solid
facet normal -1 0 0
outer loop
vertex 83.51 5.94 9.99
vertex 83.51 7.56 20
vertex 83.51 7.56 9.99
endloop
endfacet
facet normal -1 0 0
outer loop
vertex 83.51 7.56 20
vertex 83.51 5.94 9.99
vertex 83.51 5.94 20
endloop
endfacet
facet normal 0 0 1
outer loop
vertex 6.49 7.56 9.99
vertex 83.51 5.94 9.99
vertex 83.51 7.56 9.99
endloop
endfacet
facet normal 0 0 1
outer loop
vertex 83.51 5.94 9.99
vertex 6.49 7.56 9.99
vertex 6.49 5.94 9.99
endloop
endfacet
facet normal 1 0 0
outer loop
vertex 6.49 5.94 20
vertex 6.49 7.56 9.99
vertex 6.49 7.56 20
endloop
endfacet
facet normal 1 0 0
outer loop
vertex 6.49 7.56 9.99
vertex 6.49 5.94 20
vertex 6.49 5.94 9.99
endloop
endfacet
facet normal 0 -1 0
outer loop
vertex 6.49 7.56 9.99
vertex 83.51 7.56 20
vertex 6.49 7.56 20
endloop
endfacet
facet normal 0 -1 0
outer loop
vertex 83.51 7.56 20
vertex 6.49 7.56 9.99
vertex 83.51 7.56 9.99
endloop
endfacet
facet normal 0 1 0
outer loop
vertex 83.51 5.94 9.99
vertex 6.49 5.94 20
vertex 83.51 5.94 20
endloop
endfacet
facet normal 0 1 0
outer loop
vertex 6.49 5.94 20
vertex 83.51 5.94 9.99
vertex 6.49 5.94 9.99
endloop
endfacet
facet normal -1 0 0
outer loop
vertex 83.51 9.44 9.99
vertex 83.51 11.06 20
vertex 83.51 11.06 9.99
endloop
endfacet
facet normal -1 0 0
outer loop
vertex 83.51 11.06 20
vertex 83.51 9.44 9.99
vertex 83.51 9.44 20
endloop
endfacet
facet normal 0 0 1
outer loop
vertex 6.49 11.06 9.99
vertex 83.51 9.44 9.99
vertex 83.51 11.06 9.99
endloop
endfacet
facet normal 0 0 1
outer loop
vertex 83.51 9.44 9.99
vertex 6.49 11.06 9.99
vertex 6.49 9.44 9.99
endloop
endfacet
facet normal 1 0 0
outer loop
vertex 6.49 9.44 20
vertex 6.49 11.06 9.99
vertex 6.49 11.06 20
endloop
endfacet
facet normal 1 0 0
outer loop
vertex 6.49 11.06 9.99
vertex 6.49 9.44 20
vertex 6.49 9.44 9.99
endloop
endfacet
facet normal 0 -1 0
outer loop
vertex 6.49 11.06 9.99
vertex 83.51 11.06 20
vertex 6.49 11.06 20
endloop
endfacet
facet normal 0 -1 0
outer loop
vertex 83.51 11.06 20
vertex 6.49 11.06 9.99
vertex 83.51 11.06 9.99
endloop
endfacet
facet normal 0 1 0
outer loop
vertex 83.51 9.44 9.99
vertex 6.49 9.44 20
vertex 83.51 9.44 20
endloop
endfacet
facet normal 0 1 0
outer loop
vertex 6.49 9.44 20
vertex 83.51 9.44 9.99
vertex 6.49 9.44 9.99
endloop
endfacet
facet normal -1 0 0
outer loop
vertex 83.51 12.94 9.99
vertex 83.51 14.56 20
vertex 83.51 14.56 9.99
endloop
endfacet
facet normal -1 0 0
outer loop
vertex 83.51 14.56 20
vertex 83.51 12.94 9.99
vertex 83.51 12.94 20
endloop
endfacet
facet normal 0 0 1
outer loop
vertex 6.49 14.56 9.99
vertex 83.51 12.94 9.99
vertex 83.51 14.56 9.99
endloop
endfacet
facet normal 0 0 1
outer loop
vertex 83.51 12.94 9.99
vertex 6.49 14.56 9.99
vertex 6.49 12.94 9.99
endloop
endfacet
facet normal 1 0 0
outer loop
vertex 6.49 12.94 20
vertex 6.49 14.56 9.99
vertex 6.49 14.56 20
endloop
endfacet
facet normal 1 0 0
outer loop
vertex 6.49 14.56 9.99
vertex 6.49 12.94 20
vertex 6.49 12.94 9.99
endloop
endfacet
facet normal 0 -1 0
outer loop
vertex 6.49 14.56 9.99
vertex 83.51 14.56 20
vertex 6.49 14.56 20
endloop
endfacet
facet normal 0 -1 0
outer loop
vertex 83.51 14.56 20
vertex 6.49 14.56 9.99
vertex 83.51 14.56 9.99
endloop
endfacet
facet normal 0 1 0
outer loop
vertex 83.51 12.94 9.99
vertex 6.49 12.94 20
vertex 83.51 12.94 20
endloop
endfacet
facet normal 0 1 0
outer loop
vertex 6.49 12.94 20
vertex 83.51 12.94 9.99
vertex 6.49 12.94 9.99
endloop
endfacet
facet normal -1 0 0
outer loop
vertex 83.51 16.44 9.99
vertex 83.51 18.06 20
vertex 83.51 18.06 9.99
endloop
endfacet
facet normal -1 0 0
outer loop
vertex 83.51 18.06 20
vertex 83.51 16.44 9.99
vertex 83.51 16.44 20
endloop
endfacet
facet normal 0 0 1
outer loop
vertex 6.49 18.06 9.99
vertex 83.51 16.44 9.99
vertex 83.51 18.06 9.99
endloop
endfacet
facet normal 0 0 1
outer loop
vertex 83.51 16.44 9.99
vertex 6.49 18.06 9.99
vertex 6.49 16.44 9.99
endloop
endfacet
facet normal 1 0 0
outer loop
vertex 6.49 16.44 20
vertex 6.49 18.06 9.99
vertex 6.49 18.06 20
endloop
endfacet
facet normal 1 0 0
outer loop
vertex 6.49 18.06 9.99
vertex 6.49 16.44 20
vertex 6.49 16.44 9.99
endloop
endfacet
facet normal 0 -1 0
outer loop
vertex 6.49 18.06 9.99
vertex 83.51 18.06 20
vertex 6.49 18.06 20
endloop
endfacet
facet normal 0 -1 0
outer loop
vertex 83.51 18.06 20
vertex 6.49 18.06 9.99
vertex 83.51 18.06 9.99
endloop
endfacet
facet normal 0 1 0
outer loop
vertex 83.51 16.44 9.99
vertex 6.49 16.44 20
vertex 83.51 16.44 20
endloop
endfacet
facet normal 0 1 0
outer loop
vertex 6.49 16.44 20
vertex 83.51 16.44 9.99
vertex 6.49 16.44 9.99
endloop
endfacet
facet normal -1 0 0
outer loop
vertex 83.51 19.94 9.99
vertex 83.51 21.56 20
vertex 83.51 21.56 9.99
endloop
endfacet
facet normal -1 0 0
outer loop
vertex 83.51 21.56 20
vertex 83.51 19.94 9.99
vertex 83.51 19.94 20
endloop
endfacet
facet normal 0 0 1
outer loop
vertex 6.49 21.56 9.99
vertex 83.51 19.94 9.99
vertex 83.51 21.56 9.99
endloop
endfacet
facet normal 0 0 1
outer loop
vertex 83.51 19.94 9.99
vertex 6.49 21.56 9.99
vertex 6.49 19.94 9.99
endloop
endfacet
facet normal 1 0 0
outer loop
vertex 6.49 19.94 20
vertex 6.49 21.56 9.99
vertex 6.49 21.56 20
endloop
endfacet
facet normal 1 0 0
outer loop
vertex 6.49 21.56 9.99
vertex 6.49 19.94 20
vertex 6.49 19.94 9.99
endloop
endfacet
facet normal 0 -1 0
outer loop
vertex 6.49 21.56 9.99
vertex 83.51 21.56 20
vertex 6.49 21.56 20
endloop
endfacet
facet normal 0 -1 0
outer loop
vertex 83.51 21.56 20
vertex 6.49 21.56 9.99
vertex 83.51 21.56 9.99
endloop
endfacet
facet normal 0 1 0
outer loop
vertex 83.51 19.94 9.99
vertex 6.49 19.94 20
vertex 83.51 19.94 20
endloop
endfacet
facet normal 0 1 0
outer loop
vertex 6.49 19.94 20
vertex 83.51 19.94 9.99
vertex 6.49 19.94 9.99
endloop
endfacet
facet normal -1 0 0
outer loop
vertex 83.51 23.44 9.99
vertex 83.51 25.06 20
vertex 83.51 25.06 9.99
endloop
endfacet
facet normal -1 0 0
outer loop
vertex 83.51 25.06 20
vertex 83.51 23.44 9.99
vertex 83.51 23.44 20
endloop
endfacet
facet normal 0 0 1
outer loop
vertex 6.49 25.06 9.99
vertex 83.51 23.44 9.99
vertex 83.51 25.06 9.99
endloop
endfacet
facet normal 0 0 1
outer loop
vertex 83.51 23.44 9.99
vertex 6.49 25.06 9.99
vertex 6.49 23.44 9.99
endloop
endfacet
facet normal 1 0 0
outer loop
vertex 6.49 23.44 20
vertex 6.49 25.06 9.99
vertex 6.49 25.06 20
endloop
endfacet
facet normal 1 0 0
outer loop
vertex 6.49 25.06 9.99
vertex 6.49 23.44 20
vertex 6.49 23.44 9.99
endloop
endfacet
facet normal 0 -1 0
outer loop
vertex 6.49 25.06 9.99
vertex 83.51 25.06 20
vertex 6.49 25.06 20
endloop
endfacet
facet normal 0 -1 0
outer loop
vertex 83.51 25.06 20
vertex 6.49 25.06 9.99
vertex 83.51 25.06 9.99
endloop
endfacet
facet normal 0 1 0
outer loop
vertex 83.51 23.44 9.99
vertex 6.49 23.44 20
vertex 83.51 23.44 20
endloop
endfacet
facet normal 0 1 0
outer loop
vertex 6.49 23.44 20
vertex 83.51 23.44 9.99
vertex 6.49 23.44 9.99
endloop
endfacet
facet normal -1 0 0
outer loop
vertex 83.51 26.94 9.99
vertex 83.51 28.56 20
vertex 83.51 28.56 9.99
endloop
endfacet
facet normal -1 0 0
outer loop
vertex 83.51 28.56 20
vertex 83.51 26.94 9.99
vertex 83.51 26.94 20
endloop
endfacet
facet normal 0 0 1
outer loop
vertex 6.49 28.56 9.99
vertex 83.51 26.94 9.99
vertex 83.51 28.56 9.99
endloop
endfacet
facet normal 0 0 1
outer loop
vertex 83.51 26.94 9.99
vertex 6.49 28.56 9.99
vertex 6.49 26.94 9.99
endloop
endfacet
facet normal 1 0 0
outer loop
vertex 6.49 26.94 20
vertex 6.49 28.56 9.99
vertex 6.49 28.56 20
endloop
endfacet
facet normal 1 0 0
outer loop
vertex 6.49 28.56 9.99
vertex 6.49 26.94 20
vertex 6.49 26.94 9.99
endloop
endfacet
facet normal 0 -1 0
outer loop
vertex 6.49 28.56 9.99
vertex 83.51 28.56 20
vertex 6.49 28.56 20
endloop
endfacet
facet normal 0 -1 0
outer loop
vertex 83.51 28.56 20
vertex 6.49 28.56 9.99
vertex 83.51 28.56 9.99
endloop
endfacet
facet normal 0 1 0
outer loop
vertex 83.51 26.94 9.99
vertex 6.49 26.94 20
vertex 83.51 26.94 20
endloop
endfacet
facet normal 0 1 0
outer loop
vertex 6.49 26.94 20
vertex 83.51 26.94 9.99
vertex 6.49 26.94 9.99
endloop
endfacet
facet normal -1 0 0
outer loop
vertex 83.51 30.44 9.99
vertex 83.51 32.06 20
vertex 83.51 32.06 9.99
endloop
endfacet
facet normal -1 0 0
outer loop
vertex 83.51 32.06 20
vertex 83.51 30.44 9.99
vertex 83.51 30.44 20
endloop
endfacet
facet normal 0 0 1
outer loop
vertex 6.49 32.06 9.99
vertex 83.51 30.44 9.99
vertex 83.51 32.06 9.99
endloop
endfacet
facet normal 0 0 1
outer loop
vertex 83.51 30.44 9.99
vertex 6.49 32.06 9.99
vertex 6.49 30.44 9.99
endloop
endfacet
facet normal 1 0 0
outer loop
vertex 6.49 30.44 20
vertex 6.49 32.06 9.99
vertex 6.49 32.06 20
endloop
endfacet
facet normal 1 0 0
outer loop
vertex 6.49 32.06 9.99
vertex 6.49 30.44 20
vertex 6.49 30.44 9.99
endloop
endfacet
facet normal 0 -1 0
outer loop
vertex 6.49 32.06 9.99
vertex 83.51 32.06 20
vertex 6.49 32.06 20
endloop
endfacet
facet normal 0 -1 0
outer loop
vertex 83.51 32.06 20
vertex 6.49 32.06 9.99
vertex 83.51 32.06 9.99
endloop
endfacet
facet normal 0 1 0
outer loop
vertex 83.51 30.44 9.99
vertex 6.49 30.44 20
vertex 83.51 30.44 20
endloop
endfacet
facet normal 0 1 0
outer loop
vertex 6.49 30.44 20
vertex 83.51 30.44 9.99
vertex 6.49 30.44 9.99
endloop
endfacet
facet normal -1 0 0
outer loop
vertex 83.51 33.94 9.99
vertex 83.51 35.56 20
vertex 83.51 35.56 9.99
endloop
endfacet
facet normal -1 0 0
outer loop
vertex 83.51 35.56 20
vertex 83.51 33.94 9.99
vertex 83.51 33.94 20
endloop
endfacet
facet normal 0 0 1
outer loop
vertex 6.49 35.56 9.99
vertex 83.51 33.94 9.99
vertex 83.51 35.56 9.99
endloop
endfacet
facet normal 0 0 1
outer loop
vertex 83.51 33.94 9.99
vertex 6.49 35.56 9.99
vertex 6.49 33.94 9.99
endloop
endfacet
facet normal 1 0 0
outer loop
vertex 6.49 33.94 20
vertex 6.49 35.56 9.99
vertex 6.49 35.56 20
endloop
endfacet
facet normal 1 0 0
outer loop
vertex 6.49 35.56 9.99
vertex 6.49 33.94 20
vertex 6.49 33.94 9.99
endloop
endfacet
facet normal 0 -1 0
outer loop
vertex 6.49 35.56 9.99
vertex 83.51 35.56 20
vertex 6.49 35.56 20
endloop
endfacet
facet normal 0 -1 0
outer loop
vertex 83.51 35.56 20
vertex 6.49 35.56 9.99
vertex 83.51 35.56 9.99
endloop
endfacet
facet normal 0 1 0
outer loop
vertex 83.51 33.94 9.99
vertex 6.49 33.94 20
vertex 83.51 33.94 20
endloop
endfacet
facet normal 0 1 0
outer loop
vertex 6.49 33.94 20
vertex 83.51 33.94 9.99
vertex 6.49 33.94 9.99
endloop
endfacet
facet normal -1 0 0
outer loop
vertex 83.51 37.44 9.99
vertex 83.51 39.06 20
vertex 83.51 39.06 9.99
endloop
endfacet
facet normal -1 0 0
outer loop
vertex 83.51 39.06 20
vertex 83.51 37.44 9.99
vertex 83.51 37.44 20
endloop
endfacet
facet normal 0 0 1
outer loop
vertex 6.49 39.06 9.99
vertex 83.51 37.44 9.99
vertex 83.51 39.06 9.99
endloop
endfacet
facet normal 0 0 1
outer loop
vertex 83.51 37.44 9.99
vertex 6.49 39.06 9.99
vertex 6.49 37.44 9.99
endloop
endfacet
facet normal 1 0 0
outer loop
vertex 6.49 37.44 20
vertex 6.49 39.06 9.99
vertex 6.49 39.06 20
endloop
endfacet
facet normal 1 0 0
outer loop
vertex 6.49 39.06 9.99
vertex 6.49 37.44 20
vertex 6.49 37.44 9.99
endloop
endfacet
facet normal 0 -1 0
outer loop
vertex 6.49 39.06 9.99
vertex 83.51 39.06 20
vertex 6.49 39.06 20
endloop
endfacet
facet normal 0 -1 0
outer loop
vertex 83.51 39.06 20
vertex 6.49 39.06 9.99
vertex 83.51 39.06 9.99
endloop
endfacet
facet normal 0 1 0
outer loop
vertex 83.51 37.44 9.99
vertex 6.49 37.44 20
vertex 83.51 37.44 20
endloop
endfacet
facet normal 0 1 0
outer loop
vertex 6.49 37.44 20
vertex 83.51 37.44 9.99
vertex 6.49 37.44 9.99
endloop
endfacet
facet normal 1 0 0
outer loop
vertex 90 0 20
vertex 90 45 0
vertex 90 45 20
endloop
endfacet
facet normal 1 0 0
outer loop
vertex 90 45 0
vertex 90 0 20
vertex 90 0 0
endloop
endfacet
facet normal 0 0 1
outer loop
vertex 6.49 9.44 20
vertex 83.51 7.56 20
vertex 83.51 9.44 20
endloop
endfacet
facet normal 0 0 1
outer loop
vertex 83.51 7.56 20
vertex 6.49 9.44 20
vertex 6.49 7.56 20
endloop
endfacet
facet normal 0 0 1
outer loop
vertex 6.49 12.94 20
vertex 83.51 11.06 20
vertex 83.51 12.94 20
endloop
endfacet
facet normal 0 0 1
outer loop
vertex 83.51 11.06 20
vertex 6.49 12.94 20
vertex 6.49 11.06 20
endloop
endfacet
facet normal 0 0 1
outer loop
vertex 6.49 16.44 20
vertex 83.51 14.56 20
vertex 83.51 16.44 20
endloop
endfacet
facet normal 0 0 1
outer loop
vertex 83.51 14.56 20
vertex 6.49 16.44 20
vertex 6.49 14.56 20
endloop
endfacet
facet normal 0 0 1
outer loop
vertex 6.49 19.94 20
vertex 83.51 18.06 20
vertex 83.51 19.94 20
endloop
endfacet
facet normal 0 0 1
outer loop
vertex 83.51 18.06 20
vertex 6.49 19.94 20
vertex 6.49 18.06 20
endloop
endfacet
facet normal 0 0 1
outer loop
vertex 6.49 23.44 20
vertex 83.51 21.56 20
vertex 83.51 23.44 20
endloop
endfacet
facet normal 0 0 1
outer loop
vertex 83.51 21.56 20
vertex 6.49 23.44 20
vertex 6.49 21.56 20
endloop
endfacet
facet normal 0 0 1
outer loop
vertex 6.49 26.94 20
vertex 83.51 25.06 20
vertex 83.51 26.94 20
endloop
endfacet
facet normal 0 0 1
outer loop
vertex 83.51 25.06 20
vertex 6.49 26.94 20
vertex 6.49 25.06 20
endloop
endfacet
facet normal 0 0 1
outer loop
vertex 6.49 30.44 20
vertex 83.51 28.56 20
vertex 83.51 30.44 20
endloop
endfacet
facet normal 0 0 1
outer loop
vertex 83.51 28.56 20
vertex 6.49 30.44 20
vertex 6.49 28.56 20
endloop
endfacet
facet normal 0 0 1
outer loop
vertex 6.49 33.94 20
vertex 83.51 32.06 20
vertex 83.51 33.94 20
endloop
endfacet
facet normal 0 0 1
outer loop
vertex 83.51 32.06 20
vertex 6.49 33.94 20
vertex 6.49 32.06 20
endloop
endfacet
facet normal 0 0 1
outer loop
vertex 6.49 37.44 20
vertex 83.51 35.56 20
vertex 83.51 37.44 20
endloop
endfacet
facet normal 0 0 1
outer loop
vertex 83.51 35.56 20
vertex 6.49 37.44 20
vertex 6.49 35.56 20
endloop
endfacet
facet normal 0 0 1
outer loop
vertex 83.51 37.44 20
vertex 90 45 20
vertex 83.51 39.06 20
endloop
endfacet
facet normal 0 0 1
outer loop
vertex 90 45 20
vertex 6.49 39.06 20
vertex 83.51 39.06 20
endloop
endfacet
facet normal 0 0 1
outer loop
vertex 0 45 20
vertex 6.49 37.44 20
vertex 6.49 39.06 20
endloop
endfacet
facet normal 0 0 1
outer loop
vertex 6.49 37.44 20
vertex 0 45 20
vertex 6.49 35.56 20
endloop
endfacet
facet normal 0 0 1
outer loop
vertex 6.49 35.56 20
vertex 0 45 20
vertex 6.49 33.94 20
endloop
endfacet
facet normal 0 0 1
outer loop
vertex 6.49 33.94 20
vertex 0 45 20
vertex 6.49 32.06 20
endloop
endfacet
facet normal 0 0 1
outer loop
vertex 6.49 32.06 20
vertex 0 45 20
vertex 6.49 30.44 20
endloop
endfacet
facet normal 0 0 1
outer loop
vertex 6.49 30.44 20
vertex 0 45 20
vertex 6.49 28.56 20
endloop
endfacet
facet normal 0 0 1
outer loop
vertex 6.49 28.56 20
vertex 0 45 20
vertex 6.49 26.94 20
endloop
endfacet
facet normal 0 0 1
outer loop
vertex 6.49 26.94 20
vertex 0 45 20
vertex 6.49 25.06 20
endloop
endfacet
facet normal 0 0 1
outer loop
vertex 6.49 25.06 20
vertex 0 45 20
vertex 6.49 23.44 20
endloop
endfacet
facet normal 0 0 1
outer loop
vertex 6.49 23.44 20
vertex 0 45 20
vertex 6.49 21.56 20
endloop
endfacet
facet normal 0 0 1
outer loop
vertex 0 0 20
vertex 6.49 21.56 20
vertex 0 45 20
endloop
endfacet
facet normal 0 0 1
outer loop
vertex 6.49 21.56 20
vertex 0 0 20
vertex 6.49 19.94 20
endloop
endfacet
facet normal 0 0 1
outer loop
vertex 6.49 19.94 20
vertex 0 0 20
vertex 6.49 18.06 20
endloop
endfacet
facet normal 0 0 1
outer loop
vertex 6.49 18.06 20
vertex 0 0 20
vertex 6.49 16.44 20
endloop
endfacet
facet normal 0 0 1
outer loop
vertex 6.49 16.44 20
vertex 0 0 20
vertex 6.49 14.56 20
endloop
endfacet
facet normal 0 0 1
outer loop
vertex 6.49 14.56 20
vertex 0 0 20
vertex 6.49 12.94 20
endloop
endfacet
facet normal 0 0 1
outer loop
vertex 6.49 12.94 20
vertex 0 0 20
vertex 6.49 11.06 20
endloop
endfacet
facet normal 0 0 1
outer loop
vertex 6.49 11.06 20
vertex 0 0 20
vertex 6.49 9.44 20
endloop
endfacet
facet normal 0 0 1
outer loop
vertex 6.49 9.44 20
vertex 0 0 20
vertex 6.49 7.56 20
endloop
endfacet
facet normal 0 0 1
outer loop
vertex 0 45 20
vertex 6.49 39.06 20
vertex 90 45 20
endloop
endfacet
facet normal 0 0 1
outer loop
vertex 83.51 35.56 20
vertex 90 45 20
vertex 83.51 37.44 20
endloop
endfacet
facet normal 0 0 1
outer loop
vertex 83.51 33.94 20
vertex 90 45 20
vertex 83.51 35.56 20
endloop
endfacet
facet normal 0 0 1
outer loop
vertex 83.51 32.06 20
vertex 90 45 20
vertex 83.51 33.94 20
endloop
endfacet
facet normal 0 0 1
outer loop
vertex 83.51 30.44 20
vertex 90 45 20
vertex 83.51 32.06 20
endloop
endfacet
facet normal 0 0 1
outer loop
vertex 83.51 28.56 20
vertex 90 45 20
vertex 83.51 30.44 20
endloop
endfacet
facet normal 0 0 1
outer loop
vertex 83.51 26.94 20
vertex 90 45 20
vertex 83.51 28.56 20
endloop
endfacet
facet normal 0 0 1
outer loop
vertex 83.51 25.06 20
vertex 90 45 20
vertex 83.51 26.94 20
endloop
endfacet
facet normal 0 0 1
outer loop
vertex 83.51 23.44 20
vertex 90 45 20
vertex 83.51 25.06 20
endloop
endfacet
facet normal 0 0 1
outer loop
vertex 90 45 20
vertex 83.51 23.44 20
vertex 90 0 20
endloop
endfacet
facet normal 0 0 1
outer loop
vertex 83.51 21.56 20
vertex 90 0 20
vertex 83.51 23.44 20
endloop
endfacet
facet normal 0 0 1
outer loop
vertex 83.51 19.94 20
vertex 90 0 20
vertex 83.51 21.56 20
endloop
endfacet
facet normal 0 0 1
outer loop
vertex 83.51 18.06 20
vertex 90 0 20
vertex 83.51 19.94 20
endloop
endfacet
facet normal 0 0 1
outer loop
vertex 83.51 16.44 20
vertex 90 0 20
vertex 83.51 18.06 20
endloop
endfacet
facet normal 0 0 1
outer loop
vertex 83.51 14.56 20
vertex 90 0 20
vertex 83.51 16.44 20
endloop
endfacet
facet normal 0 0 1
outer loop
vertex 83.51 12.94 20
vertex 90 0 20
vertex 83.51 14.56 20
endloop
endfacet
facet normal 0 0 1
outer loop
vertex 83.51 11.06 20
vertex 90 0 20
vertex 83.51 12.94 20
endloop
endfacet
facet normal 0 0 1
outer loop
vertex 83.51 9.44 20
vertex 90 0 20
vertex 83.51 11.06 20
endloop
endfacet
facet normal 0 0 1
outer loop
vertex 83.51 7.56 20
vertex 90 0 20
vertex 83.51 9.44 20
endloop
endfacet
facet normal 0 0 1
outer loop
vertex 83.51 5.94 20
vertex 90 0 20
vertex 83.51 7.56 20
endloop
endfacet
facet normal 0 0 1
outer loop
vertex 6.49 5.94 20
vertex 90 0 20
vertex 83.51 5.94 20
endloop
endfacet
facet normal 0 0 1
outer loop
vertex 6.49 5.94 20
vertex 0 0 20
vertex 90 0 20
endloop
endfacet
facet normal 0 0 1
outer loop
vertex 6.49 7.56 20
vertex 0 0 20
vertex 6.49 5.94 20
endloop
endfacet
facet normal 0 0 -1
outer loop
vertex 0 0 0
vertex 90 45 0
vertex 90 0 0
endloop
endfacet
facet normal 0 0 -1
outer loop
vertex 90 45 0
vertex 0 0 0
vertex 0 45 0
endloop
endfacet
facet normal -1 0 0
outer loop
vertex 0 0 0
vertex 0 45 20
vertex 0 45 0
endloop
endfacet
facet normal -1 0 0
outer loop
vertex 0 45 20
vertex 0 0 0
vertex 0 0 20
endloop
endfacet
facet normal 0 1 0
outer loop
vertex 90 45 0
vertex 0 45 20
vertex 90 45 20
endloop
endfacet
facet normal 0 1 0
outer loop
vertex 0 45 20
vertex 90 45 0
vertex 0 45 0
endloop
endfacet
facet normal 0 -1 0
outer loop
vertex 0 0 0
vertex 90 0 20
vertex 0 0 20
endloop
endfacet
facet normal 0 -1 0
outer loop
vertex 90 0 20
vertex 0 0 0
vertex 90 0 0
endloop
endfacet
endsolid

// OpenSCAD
// Drying rack for 10 microscope slides
// Slide dimensions: 75 x 25 x 1 mm (L x W x T)
// Base block: 90 x 45 x 20 mm (X x Y x Z)
// Slots: 10 parallel slots along X, 77 mm long, 1.6 mm wide, 10 mm deep
// Slots spacing: 3.5 mm centre-to-centre in Y
// Slots group centred on block in X and Y

// Base block dimensions
base_length = 90;   // X
base_width  = 45;   // Y
base_height = 20;   // Z

// Slot dimensions
num_slots   = 10;
slot_length = 77;   // along X
slot_width  = 1.6;  // along Y
slot_depth  = 10;   // along Z
slot_pitch  = 3.5;  // centre-to-centre spacing in Y

// Calculate slot positions (centred in Y)
// Total slot group width = num_slots * slot_pitch - (num_slots - 1) * (slot_width - slot_pitch)
// But easier: first slot Y position = (base_width - (num_slots - 1)*slot_pitch - slot_width)/2
first_slot_y = (base_width - (num_slots - 1)*slot_pitch - slot_width) / 2;

// Slot group X-centre (base_length - slot_length)/2
slot_x_offset = (base_length - slot_length) / 2;

// Base block
module base_block() {
    cube([base_length, base_width, base_height]);
}

// Slot module
module slot(x_pos, y_pos) {
    // Slot extends 0.01mm past the block in all directions for clean cutting
    translate([x_pos - 0.01, y_pos - 0.01, base_height - slot_depth - 0.01])
        cube([slot_length + 0.02, slot_width + 0.02, slot_depth + 0.02]);
}

// Build the rack
difference() {
    base_block();
    
    // Cut slots
    for (i = [0 : num_slots - 1]) {
        // Calculate Y position of each slot centre
        slot_y = first_slot_y + i * slot_pitch;
        slot(slot_x_offset, slot_y);
    }
}
